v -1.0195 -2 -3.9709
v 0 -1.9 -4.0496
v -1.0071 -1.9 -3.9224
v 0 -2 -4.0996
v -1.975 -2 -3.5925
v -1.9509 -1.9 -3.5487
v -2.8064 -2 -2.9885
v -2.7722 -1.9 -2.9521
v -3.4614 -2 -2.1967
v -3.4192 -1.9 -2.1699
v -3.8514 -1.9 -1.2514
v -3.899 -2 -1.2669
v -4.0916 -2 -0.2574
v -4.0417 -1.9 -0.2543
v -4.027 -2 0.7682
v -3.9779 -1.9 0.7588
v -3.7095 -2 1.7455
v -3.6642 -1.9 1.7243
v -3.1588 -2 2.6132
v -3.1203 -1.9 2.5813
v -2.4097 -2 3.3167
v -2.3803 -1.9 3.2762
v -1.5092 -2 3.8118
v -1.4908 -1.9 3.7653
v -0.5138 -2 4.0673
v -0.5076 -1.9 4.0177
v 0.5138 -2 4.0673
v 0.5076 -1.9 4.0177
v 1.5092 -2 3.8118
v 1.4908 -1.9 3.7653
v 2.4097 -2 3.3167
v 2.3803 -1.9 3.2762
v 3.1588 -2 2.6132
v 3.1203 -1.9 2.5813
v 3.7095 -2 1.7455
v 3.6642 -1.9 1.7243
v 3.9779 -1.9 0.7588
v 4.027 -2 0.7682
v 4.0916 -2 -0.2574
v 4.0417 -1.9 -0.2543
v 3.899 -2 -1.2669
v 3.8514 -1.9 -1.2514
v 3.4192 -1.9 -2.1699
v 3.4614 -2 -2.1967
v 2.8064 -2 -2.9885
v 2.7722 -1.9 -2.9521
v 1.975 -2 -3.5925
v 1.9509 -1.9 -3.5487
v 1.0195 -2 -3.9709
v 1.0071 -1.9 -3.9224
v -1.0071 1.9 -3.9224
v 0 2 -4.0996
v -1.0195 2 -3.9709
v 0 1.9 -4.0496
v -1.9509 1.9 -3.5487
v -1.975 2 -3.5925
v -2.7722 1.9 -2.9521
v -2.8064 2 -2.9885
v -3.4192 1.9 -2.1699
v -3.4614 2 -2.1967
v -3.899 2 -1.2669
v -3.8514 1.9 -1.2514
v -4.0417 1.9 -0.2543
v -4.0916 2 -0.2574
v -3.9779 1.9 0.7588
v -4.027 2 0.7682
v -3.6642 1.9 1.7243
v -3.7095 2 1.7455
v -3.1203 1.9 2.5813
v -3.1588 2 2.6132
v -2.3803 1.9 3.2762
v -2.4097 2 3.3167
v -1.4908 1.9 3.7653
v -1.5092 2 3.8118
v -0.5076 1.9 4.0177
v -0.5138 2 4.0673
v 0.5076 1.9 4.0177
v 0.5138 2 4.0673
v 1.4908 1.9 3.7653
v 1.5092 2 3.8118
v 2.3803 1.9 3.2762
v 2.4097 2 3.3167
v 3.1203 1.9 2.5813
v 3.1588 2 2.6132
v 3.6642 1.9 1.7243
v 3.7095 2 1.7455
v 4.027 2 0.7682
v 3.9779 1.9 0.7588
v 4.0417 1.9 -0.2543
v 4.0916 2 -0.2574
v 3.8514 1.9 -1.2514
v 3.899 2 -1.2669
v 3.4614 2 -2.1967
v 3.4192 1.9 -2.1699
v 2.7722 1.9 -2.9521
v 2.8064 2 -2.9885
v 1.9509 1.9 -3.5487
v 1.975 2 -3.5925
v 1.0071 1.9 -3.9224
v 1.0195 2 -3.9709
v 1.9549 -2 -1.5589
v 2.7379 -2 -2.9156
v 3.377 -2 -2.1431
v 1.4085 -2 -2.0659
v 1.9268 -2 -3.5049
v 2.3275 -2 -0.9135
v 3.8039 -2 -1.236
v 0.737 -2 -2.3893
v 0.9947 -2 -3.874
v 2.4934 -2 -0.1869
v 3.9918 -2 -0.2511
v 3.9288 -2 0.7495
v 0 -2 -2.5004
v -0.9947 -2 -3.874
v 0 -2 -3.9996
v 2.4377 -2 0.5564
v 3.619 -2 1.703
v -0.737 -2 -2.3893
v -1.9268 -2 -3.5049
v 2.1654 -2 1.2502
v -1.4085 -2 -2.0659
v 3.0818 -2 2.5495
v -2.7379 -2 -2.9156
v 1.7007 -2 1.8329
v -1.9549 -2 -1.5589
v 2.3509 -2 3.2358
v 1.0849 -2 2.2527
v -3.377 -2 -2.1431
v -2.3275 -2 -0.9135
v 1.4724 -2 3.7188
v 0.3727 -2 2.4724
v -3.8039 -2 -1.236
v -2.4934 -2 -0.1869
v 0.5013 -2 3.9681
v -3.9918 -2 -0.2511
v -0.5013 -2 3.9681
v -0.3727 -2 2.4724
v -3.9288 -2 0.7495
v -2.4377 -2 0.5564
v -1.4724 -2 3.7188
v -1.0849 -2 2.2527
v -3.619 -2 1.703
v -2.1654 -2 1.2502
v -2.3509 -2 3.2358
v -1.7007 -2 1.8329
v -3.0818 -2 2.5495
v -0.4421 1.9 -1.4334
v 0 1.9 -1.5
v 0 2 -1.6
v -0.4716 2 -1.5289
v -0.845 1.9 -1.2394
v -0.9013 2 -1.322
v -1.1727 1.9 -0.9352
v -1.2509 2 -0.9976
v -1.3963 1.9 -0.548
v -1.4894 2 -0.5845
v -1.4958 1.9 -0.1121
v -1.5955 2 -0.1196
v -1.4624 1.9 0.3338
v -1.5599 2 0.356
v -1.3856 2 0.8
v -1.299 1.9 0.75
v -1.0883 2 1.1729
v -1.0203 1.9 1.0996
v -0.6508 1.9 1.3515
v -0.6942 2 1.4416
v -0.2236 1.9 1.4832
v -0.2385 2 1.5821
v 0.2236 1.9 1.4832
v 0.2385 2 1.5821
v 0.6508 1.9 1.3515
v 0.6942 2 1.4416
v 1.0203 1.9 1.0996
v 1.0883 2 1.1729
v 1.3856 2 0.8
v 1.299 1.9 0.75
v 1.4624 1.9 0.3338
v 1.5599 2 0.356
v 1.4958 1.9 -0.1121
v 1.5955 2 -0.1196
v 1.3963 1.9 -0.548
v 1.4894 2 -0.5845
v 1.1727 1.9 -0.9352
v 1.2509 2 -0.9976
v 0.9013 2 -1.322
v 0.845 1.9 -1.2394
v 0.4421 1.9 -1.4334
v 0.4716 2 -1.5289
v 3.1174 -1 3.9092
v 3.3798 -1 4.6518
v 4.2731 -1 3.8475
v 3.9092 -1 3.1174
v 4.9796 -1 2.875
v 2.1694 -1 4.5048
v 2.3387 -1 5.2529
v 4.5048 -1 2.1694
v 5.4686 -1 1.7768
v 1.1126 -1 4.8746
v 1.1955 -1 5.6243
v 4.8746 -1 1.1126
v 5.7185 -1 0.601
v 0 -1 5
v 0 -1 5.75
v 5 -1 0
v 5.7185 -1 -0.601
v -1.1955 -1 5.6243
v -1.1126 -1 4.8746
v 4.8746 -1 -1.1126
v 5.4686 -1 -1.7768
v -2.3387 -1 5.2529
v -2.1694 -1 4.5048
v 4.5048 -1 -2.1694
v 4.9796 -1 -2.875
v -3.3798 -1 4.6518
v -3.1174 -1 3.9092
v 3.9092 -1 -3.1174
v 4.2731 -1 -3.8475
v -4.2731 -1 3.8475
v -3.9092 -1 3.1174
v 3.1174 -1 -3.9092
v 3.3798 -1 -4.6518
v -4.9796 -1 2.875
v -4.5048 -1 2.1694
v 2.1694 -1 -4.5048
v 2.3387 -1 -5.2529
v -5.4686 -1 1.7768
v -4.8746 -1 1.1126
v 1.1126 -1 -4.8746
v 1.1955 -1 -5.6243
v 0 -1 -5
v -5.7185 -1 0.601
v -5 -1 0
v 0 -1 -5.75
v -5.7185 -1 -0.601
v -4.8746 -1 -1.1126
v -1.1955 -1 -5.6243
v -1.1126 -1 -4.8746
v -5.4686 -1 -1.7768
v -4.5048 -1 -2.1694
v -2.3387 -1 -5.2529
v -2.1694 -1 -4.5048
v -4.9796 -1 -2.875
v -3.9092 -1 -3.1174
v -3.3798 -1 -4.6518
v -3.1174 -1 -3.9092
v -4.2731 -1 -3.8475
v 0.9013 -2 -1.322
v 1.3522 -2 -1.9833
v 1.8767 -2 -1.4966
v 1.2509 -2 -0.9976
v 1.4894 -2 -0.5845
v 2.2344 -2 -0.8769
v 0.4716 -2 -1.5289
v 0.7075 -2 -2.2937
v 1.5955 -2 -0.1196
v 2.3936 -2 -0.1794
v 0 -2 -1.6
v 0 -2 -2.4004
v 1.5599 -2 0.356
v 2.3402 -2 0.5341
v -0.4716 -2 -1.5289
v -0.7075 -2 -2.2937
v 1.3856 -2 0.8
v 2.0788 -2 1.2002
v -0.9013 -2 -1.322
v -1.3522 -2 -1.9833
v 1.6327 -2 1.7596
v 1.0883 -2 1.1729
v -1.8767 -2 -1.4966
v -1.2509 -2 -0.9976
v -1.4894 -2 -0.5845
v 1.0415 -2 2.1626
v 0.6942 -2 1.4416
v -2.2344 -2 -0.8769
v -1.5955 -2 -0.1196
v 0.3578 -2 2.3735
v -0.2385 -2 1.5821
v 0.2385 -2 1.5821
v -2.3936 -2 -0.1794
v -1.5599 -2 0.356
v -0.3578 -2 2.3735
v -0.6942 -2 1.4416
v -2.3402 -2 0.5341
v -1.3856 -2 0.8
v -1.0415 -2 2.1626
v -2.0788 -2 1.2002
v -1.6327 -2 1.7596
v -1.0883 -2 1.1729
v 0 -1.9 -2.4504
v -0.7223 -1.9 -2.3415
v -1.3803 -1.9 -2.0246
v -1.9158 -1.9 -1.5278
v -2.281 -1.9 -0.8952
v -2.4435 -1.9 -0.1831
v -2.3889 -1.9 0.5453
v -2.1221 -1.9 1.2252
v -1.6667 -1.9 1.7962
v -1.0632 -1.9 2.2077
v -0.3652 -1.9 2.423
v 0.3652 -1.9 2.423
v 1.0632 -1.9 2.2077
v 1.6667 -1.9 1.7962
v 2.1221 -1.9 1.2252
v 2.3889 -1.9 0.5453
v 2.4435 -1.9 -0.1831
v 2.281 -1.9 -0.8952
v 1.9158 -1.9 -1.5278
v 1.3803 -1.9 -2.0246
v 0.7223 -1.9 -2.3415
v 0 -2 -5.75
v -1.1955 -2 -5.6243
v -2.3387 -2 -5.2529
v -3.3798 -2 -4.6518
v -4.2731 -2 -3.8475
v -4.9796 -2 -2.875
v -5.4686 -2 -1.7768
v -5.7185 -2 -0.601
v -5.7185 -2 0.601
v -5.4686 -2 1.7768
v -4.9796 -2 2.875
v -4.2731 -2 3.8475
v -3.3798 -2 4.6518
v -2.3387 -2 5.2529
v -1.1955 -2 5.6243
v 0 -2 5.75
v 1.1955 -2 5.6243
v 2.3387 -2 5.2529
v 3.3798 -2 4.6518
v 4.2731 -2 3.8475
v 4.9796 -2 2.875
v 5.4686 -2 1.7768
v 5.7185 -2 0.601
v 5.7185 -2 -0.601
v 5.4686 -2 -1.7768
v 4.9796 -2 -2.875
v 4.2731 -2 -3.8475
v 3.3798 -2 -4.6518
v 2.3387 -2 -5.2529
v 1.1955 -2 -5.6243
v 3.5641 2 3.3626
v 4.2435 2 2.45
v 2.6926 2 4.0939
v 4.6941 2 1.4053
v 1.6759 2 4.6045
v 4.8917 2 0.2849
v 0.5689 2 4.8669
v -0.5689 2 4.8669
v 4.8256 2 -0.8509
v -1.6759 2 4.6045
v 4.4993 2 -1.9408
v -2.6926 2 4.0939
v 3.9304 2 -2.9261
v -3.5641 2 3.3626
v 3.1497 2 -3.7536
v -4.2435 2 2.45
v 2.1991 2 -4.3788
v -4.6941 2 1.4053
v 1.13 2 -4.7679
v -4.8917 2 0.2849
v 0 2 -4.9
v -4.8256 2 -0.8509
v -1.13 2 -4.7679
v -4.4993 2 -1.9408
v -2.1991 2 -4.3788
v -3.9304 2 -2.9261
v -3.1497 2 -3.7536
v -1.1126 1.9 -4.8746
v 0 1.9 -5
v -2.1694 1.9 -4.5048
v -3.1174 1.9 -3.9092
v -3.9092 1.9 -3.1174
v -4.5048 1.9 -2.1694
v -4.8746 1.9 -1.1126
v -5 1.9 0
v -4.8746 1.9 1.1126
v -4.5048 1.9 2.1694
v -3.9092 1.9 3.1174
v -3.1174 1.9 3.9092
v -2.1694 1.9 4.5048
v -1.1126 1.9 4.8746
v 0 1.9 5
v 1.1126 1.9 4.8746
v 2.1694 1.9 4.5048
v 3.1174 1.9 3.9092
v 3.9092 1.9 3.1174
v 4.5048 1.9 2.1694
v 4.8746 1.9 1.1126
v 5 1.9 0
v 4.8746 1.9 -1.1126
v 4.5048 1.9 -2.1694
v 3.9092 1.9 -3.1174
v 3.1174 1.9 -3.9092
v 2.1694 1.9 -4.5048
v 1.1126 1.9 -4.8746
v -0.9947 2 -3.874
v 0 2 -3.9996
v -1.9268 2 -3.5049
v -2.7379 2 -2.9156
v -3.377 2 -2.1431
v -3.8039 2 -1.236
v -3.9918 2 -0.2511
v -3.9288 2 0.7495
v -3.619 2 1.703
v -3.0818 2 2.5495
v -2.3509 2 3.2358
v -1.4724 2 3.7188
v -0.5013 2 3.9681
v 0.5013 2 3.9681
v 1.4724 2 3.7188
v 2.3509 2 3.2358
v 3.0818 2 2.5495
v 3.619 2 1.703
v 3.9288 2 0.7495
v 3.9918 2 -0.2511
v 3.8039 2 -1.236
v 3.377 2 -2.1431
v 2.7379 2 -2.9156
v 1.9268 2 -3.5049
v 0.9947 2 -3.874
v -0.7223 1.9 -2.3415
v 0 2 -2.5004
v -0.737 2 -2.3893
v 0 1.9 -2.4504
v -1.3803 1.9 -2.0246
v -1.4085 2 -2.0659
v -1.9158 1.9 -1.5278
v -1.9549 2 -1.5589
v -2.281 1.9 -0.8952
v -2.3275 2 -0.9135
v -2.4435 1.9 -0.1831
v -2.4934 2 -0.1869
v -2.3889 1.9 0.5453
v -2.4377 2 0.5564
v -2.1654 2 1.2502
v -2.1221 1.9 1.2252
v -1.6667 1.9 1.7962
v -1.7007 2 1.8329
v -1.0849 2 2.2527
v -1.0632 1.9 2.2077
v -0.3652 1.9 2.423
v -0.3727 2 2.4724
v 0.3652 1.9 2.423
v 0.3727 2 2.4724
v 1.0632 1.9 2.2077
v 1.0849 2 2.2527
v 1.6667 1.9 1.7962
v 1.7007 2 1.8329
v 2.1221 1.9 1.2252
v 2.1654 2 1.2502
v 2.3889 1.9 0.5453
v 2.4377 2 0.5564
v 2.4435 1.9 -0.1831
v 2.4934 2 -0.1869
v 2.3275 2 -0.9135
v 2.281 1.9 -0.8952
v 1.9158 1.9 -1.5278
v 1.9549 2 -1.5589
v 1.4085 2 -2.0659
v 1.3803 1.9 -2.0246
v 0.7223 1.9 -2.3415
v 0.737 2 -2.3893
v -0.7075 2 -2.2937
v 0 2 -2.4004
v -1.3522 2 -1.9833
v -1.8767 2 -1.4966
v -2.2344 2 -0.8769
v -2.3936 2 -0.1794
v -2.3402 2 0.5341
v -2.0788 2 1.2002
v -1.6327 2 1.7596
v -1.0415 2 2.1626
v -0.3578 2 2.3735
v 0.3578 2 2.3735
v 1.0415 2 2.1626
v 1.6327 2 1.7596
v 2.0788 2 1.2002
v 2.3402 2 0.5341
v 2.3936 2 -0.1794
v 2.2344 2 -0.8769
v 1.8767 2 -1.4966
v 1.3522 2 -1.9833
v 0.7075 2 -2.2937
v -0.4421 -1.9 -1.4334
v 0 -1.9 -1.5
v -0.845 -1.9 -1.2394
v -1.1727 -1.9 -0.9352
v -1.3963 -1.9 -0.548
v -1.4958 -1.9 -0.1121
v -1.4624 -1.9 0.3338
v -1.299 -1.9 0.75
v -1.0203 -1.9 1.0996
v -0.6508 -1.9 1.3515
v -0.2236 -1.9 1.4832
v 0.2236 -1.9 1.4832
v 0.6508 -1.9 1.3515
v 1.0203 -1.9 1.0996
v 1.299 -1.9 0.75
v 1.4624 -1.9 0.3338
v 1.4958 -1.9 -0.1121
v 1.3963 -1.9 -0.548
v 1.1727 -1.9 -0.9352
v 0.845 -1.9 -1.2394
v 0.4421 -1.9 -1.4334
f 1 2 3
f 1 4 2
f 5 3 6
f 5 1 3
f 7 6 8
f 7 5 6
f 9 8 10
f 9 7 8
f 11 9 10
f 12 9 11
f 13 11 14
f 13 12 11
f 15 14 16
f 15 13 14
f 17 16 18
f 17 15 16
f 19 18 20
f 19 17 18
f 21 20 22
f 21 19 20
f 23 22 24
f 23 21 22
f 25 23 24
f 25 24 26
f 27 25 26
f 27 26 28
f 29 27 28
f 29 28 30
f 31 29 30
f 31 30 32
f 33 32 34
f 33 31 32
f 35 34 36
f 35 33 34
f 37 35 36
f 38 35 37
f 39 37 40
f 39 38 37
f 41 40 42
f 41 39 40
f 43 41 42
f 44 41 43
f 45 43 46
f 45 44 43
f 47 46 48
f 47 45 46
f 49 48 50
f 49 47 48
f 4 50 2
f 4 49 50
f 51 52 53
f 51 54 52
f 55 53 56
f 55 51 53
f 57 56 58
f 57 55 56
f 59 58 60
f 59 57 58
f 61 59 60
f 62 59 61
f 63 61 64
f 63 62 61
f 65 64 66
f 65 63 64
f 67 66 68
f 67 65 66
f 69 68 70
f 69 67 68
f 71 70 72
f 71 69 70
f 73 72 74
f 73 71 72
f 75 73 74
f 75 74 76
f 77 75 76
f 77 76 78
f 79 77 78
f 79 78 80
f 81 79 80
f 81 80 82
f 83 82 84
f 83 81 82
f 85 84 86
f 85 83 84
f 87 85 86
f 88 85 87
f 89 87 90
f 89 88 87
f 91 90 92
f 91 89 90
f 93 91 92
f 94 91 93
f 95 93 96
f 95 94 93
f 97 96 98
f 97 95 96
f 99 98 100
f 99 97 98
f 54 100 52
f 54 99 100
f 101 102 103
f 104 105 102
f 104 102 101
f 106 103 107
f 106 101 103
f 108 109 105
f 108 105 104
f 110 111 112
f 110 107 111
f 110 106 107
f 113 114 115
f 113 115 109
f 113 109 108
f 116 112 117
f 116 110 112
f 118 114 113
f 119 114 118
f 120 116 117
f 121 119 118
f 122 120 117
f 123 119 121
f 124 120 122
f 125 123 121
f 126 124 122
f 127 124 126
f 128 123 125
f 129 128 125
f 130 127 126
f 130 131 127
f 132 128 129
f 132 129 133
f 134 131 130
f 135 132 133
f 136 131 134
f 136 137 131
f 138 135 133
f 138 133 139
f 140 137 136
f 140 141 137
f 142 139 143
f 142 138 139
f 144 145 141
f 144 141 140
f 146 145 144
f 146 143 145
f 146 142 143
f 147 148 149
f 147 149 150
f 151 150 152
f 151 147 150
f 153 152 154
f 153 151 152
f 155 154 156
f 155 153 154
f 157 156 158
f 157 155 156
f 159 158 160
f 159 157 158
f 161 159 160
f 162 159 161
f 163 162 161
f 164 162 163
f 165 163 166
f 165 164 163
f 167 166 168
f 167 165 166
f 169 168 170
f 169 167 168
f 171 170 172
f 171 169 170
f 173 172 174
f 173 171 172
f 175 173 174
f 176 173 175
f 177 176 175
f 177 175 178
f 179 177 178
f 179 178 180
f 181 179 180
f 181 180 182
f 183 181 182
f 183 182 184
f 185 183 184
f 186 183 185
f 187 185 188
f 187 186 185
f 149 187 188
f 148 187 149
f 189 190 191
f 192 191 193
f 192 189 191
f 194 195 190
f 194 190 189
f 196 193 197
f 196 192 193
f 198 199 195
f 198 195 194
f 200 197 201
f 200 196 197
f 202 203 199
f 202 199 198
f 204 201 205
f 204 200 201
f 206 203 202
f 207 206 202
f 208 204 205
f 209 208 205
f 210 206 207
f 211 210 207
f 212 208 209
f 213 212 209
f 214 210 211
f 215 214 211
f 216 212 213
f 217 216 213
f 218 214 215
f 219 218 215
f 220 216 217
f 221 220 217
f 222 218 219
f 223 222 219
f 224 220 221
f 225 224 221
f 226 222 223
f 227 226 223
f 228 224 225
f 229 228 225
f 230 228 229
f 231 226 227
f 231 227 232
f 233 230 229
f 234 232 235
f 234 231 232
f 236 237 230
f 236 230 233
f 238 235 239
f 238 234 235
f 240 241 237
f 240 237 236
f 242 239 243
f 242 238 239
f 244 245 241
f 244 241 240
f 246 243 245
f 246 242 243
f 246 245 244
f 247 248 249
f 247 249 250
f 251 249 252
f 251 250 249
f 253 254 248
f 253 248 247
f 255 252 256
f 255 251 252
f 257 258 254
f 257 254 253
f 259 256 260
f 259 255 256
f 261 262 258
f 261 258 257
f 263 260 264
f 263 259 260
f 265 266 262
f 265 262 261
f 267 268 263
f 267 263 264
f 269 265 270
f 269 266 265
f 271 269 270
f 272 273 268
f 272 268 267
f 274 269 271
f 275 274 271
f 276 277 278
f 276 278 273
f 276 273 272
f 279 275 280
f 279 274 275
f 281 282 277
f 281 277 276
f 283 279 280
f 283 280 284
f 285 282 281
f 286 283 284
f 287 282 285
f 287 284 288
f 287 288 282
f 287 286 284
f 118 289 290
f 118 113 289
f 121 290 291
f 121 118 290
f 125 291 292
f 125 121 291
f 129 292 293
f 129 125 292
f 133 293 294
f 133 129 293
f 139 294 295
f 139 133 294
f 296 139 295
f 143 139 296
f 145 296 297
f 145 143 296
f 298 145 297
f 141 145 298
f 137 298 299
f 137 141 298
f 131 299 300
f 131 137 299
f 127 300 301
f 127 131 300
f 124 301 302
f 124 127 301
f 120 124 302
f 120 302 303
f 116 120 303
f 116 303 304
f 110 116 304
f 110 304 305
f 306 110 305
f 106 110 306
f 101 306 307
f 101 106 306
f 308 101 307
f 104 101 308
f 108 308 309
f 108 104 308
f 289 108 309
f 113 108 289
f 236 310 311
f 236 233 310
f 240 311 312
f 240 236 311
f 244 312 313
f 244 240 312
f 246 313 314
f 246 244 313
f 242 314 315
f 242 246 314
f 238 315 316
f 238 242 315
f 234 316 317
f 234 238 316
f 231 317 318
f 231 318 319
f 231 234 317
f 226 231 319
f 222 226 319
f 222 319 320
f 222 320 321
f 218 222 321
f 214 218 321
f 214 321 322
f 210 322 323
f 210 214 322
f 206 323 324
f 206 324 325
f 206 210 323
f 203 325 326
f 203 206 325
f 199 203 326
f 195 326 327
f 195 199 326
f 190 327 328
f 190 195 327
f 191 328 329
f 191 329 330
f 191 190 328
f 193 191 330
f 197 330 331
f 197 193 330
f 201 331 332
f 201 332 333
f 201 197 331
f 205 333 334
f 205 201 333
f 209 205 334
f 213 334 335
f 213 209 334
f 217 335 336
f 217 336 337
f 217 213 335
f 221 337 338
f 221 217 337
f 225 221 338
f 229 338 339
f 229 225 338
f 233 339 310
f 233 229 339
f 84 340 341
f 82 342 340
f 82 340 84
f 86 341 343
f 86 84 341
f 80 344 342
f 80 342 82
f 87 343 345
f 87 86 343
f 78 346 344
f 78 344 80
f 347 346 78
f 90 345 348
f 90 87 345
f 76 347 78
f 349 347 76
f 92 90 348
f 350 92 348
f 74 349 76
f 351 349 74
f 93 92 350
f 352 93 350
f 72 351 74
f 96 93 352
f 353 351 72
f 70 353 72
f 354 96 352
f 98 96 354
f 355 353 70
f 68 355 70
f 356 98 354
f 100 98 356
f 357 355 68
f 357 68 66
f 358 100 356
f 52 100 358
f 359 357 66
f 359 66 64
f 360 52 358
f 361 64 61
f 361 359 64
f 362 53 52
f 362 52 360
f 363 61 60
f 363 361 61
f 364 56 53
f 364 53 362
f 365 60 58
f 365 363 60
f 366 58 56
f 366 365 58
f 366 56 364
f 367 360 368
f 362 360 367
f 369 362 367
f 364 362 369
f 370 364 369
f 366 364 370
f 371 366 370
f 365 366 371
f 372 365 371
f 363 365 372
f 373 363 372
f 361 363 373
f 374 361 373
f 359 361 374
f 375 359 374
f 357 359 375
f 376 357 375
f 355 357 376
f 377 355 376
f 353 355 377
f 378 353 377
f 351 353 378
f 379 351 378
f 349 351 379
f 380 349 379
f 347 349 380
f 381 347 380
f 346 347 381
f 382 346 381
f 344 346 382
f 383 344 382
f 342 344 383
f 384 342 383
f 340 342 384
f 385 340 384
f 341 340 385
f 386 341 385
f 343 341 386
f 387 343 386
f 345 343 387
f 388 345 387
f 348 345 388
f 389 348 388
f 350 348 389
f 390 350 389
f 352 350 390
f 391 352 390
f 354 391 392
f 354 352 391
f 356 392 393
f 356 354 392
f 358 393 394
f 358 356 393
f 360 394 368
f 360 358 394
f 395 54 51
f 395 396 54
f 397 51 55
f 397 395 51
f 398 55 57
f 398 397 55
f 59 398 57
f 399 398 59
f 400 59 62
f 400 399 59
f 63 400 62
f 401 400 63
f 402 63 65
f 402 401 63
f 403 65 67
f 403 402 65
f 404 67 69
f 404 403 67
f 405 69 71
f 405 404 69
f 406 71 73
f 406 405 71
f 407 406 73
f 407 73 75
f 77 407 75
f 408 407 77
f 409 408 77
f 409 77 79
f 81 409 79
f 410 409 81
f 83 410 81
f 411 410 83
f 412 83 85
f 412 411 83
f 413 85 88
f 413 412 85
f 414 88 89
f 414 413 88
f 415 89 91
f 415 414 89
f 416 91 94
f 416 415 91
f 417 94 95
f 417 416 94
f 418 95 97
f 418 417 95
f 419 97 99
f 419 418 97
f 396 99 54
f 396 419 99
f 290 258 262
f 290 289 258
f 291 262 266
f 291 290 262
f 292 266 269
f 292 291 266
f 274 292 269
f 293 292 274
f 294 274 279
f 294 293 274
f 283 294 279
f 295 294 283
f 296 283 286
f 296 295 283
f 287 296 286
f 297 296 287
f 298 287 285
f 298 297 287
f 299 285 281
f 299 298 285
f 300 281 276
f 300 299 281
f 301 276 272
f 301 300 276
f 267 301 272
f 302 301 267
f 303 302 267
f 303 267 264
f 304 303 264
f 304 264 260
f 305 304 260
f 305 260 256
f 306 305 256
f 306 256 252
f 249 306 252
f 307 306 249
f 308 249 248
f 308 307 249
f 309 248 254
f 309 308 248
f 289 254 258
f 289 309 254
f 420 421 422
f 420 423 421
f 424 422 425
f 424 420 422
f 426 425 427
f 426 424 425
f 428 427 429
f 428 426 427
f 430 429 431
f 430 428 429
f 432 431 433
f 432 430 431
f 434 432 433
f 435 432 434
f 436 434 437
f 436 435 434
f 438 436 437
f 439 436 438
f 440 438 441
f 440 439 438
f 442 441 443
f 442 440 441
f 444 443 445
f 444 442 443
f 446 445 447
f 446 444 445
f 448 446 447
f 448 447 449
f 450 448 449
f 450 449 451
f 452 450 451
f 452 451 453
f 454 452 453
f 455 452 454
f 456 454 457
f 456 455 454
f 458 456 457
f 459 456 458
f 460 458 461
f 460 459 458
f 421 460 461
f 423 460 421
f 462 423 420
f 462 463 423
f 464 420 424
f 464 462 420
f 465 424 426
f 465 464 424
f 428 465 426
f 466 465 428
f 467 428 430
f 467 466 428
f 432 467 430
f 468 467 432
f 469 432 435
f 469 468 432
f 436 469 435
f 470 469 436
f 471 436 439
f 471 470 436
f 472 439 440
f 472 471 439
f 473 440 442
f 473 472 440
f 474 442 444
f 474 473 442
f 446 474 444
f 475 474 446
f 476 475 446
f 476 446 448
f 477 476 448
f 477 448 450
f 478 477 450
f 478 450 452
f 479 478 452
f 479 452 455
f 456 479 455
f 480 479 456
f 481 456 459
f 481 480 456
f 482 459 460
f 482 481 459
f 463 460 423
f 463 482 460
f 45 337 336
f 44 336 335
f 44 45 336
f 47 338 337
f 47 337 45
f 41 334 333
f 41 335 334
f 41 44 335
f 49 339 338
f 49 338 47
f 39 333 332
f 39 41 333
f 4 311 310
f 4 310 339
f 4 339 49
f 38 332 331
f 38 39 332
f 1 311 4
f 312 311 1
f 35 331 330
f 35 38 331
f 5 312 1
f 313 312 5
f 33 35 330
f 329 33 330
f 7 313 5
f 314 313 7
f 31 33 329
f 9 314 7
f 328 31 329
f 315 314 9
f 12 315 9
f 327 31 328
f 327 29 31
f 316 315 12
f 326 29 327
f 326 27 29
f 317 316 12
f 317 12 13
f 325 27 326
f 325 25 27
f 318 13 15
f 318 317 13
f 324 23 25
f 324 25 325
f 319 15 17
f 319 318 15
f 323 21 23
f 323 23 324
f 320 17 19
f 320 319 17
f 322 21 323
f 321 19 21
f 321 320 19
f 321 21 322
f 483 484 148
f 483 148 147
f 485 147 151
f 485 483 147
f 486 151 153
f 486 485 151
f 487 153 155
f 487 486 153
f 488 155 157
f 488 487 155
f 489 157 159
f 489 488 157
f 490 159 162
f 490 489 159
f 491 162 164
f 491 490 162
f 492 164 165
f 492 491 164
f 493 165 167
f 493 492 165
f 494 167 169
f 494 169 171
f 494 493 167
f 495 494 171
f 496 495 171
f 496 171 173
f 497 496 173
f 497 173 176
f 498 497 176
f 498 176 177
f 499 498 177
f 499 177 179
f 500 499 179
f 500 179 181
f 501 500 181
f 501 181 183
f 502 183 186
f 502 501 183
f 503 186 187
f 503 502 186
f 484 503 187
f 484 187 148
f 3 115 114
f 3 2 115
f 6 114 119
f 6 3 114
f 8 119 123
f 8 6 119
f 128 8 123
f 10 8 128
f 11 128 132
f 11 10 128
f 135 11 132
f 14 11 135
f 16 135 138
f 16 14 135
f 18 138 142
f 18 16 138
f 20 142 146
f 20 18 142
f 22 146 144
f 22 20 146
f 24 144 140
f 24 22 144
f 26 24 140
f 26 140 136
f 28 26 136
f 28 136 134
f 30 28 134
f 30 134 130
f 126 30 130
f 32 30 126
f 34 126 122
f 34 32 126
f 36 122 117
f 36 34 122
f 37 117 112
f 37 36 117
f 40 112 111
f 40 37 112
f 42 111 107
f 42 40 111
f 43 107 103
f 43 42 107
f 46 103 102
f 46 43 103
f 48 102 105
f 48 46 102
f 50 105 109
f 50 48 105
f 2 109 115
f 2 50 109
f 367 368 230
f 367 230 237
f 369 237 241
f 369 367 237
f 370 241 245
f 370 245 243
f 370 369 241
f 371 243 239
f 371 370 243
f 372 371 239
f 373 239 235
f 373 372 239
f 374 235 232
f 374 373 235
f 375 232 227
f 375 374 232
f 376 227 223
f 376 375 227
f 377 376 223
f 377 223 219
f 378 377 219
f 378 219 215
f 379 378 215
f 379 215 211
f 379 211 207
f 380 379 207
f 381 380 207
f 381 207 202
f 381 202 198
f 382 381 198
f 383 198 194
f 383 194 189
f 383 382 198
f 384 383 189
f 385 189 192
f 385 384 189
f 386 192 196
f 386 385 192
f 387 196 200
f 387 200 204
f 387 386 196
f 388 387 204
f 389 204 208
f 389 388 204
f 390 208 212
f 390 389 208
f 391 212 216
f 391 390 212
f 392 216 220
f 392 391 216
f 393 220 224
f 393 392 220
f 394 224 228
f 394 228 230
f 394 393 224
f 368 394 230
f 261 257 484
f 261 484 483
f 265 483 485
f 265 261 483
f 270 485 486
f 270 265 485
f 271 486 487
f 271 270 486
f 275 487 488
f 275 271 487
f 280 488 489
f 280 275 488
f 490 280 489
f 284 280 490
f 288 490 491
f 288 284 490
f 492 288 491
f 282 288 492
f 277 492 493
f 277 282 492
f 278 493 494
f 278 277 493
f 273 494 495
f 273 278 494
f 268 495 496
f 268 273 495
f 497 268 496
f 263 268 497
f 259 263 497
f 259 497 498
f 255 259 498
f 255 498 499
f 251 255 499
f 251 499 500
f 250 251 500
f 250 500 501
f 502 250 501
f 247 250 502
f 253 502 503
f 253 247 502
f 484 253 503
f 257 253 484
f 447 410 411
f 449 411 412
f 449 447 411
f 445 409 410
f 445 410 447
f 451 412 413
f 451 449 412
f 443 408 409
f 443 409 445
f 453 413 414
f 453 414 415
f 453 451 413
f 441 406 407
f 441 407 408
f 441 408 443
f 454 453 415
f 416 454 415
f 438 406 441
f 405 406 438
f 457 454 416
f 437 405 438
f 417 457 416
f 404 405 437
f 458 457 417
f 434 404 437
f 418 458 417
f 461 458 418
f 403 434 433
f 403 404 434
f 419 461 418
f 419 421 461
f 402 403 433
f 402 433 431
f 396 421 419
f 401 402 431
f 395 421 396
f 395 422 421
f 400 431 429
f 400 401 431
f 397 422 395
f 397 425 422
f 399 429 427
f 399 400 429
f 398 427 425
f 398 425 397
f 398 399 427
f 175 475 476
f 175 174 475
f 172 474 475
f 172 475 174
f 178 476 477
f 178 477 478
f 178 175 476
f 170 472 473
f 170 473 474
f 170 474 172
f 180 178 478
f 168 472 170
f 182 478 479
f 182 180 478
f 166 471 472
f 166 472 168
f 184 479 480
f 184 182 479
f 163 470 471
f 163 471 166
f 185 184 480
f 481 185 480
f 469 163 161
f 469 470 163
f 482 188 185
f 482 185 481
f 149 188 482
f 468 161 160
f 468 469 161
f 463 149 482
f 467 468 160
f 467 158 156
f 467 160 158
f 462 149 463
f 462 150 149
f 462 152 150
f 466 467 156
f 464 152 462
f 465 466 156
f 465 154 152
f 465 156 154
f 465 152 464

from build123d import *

# Parameters (mm, degrees)
CHAMFER1_SIZE = 0.1


with BuildPart() as part:
    # Sketch1 → Revolve1 (revolve)
    with BuildSketch(Plane(origin=(0, 0, 0), x_dir=(0, 0, -1), z_dir=(1, 0, 0))):
        Polygon((5, -1), (5, 2), (4.099649114, 2), (4.049649114, 1.9), (3.999649114, 2), (2.500350886, 2), (2.450350886, 1.9), (2.400350886, 2), (1.5, 2), (1.5, -2), (2.400350886, -2), (2.450350886, -1.9), (2.500350886, -2), (3.999649114, -2), (4.049649114, -1.9), (4.099649114, -2), (5.75, -2), (5.75, -1), align=None)
    revolve(axis=Axis((0, -2, 0), (0, 1, 0)))

    # Chamfer1
    chamfer1_edges = [part.edges().sort_by_distance(p)[0] for p in [
        (0, 2, 1.5),
        (0, 2, 5),
        (0, -2, 1.5),
    ]]
    chamfer(chamfer1_edges, length=CHAMFER1_SIZE)


solid = part.part
